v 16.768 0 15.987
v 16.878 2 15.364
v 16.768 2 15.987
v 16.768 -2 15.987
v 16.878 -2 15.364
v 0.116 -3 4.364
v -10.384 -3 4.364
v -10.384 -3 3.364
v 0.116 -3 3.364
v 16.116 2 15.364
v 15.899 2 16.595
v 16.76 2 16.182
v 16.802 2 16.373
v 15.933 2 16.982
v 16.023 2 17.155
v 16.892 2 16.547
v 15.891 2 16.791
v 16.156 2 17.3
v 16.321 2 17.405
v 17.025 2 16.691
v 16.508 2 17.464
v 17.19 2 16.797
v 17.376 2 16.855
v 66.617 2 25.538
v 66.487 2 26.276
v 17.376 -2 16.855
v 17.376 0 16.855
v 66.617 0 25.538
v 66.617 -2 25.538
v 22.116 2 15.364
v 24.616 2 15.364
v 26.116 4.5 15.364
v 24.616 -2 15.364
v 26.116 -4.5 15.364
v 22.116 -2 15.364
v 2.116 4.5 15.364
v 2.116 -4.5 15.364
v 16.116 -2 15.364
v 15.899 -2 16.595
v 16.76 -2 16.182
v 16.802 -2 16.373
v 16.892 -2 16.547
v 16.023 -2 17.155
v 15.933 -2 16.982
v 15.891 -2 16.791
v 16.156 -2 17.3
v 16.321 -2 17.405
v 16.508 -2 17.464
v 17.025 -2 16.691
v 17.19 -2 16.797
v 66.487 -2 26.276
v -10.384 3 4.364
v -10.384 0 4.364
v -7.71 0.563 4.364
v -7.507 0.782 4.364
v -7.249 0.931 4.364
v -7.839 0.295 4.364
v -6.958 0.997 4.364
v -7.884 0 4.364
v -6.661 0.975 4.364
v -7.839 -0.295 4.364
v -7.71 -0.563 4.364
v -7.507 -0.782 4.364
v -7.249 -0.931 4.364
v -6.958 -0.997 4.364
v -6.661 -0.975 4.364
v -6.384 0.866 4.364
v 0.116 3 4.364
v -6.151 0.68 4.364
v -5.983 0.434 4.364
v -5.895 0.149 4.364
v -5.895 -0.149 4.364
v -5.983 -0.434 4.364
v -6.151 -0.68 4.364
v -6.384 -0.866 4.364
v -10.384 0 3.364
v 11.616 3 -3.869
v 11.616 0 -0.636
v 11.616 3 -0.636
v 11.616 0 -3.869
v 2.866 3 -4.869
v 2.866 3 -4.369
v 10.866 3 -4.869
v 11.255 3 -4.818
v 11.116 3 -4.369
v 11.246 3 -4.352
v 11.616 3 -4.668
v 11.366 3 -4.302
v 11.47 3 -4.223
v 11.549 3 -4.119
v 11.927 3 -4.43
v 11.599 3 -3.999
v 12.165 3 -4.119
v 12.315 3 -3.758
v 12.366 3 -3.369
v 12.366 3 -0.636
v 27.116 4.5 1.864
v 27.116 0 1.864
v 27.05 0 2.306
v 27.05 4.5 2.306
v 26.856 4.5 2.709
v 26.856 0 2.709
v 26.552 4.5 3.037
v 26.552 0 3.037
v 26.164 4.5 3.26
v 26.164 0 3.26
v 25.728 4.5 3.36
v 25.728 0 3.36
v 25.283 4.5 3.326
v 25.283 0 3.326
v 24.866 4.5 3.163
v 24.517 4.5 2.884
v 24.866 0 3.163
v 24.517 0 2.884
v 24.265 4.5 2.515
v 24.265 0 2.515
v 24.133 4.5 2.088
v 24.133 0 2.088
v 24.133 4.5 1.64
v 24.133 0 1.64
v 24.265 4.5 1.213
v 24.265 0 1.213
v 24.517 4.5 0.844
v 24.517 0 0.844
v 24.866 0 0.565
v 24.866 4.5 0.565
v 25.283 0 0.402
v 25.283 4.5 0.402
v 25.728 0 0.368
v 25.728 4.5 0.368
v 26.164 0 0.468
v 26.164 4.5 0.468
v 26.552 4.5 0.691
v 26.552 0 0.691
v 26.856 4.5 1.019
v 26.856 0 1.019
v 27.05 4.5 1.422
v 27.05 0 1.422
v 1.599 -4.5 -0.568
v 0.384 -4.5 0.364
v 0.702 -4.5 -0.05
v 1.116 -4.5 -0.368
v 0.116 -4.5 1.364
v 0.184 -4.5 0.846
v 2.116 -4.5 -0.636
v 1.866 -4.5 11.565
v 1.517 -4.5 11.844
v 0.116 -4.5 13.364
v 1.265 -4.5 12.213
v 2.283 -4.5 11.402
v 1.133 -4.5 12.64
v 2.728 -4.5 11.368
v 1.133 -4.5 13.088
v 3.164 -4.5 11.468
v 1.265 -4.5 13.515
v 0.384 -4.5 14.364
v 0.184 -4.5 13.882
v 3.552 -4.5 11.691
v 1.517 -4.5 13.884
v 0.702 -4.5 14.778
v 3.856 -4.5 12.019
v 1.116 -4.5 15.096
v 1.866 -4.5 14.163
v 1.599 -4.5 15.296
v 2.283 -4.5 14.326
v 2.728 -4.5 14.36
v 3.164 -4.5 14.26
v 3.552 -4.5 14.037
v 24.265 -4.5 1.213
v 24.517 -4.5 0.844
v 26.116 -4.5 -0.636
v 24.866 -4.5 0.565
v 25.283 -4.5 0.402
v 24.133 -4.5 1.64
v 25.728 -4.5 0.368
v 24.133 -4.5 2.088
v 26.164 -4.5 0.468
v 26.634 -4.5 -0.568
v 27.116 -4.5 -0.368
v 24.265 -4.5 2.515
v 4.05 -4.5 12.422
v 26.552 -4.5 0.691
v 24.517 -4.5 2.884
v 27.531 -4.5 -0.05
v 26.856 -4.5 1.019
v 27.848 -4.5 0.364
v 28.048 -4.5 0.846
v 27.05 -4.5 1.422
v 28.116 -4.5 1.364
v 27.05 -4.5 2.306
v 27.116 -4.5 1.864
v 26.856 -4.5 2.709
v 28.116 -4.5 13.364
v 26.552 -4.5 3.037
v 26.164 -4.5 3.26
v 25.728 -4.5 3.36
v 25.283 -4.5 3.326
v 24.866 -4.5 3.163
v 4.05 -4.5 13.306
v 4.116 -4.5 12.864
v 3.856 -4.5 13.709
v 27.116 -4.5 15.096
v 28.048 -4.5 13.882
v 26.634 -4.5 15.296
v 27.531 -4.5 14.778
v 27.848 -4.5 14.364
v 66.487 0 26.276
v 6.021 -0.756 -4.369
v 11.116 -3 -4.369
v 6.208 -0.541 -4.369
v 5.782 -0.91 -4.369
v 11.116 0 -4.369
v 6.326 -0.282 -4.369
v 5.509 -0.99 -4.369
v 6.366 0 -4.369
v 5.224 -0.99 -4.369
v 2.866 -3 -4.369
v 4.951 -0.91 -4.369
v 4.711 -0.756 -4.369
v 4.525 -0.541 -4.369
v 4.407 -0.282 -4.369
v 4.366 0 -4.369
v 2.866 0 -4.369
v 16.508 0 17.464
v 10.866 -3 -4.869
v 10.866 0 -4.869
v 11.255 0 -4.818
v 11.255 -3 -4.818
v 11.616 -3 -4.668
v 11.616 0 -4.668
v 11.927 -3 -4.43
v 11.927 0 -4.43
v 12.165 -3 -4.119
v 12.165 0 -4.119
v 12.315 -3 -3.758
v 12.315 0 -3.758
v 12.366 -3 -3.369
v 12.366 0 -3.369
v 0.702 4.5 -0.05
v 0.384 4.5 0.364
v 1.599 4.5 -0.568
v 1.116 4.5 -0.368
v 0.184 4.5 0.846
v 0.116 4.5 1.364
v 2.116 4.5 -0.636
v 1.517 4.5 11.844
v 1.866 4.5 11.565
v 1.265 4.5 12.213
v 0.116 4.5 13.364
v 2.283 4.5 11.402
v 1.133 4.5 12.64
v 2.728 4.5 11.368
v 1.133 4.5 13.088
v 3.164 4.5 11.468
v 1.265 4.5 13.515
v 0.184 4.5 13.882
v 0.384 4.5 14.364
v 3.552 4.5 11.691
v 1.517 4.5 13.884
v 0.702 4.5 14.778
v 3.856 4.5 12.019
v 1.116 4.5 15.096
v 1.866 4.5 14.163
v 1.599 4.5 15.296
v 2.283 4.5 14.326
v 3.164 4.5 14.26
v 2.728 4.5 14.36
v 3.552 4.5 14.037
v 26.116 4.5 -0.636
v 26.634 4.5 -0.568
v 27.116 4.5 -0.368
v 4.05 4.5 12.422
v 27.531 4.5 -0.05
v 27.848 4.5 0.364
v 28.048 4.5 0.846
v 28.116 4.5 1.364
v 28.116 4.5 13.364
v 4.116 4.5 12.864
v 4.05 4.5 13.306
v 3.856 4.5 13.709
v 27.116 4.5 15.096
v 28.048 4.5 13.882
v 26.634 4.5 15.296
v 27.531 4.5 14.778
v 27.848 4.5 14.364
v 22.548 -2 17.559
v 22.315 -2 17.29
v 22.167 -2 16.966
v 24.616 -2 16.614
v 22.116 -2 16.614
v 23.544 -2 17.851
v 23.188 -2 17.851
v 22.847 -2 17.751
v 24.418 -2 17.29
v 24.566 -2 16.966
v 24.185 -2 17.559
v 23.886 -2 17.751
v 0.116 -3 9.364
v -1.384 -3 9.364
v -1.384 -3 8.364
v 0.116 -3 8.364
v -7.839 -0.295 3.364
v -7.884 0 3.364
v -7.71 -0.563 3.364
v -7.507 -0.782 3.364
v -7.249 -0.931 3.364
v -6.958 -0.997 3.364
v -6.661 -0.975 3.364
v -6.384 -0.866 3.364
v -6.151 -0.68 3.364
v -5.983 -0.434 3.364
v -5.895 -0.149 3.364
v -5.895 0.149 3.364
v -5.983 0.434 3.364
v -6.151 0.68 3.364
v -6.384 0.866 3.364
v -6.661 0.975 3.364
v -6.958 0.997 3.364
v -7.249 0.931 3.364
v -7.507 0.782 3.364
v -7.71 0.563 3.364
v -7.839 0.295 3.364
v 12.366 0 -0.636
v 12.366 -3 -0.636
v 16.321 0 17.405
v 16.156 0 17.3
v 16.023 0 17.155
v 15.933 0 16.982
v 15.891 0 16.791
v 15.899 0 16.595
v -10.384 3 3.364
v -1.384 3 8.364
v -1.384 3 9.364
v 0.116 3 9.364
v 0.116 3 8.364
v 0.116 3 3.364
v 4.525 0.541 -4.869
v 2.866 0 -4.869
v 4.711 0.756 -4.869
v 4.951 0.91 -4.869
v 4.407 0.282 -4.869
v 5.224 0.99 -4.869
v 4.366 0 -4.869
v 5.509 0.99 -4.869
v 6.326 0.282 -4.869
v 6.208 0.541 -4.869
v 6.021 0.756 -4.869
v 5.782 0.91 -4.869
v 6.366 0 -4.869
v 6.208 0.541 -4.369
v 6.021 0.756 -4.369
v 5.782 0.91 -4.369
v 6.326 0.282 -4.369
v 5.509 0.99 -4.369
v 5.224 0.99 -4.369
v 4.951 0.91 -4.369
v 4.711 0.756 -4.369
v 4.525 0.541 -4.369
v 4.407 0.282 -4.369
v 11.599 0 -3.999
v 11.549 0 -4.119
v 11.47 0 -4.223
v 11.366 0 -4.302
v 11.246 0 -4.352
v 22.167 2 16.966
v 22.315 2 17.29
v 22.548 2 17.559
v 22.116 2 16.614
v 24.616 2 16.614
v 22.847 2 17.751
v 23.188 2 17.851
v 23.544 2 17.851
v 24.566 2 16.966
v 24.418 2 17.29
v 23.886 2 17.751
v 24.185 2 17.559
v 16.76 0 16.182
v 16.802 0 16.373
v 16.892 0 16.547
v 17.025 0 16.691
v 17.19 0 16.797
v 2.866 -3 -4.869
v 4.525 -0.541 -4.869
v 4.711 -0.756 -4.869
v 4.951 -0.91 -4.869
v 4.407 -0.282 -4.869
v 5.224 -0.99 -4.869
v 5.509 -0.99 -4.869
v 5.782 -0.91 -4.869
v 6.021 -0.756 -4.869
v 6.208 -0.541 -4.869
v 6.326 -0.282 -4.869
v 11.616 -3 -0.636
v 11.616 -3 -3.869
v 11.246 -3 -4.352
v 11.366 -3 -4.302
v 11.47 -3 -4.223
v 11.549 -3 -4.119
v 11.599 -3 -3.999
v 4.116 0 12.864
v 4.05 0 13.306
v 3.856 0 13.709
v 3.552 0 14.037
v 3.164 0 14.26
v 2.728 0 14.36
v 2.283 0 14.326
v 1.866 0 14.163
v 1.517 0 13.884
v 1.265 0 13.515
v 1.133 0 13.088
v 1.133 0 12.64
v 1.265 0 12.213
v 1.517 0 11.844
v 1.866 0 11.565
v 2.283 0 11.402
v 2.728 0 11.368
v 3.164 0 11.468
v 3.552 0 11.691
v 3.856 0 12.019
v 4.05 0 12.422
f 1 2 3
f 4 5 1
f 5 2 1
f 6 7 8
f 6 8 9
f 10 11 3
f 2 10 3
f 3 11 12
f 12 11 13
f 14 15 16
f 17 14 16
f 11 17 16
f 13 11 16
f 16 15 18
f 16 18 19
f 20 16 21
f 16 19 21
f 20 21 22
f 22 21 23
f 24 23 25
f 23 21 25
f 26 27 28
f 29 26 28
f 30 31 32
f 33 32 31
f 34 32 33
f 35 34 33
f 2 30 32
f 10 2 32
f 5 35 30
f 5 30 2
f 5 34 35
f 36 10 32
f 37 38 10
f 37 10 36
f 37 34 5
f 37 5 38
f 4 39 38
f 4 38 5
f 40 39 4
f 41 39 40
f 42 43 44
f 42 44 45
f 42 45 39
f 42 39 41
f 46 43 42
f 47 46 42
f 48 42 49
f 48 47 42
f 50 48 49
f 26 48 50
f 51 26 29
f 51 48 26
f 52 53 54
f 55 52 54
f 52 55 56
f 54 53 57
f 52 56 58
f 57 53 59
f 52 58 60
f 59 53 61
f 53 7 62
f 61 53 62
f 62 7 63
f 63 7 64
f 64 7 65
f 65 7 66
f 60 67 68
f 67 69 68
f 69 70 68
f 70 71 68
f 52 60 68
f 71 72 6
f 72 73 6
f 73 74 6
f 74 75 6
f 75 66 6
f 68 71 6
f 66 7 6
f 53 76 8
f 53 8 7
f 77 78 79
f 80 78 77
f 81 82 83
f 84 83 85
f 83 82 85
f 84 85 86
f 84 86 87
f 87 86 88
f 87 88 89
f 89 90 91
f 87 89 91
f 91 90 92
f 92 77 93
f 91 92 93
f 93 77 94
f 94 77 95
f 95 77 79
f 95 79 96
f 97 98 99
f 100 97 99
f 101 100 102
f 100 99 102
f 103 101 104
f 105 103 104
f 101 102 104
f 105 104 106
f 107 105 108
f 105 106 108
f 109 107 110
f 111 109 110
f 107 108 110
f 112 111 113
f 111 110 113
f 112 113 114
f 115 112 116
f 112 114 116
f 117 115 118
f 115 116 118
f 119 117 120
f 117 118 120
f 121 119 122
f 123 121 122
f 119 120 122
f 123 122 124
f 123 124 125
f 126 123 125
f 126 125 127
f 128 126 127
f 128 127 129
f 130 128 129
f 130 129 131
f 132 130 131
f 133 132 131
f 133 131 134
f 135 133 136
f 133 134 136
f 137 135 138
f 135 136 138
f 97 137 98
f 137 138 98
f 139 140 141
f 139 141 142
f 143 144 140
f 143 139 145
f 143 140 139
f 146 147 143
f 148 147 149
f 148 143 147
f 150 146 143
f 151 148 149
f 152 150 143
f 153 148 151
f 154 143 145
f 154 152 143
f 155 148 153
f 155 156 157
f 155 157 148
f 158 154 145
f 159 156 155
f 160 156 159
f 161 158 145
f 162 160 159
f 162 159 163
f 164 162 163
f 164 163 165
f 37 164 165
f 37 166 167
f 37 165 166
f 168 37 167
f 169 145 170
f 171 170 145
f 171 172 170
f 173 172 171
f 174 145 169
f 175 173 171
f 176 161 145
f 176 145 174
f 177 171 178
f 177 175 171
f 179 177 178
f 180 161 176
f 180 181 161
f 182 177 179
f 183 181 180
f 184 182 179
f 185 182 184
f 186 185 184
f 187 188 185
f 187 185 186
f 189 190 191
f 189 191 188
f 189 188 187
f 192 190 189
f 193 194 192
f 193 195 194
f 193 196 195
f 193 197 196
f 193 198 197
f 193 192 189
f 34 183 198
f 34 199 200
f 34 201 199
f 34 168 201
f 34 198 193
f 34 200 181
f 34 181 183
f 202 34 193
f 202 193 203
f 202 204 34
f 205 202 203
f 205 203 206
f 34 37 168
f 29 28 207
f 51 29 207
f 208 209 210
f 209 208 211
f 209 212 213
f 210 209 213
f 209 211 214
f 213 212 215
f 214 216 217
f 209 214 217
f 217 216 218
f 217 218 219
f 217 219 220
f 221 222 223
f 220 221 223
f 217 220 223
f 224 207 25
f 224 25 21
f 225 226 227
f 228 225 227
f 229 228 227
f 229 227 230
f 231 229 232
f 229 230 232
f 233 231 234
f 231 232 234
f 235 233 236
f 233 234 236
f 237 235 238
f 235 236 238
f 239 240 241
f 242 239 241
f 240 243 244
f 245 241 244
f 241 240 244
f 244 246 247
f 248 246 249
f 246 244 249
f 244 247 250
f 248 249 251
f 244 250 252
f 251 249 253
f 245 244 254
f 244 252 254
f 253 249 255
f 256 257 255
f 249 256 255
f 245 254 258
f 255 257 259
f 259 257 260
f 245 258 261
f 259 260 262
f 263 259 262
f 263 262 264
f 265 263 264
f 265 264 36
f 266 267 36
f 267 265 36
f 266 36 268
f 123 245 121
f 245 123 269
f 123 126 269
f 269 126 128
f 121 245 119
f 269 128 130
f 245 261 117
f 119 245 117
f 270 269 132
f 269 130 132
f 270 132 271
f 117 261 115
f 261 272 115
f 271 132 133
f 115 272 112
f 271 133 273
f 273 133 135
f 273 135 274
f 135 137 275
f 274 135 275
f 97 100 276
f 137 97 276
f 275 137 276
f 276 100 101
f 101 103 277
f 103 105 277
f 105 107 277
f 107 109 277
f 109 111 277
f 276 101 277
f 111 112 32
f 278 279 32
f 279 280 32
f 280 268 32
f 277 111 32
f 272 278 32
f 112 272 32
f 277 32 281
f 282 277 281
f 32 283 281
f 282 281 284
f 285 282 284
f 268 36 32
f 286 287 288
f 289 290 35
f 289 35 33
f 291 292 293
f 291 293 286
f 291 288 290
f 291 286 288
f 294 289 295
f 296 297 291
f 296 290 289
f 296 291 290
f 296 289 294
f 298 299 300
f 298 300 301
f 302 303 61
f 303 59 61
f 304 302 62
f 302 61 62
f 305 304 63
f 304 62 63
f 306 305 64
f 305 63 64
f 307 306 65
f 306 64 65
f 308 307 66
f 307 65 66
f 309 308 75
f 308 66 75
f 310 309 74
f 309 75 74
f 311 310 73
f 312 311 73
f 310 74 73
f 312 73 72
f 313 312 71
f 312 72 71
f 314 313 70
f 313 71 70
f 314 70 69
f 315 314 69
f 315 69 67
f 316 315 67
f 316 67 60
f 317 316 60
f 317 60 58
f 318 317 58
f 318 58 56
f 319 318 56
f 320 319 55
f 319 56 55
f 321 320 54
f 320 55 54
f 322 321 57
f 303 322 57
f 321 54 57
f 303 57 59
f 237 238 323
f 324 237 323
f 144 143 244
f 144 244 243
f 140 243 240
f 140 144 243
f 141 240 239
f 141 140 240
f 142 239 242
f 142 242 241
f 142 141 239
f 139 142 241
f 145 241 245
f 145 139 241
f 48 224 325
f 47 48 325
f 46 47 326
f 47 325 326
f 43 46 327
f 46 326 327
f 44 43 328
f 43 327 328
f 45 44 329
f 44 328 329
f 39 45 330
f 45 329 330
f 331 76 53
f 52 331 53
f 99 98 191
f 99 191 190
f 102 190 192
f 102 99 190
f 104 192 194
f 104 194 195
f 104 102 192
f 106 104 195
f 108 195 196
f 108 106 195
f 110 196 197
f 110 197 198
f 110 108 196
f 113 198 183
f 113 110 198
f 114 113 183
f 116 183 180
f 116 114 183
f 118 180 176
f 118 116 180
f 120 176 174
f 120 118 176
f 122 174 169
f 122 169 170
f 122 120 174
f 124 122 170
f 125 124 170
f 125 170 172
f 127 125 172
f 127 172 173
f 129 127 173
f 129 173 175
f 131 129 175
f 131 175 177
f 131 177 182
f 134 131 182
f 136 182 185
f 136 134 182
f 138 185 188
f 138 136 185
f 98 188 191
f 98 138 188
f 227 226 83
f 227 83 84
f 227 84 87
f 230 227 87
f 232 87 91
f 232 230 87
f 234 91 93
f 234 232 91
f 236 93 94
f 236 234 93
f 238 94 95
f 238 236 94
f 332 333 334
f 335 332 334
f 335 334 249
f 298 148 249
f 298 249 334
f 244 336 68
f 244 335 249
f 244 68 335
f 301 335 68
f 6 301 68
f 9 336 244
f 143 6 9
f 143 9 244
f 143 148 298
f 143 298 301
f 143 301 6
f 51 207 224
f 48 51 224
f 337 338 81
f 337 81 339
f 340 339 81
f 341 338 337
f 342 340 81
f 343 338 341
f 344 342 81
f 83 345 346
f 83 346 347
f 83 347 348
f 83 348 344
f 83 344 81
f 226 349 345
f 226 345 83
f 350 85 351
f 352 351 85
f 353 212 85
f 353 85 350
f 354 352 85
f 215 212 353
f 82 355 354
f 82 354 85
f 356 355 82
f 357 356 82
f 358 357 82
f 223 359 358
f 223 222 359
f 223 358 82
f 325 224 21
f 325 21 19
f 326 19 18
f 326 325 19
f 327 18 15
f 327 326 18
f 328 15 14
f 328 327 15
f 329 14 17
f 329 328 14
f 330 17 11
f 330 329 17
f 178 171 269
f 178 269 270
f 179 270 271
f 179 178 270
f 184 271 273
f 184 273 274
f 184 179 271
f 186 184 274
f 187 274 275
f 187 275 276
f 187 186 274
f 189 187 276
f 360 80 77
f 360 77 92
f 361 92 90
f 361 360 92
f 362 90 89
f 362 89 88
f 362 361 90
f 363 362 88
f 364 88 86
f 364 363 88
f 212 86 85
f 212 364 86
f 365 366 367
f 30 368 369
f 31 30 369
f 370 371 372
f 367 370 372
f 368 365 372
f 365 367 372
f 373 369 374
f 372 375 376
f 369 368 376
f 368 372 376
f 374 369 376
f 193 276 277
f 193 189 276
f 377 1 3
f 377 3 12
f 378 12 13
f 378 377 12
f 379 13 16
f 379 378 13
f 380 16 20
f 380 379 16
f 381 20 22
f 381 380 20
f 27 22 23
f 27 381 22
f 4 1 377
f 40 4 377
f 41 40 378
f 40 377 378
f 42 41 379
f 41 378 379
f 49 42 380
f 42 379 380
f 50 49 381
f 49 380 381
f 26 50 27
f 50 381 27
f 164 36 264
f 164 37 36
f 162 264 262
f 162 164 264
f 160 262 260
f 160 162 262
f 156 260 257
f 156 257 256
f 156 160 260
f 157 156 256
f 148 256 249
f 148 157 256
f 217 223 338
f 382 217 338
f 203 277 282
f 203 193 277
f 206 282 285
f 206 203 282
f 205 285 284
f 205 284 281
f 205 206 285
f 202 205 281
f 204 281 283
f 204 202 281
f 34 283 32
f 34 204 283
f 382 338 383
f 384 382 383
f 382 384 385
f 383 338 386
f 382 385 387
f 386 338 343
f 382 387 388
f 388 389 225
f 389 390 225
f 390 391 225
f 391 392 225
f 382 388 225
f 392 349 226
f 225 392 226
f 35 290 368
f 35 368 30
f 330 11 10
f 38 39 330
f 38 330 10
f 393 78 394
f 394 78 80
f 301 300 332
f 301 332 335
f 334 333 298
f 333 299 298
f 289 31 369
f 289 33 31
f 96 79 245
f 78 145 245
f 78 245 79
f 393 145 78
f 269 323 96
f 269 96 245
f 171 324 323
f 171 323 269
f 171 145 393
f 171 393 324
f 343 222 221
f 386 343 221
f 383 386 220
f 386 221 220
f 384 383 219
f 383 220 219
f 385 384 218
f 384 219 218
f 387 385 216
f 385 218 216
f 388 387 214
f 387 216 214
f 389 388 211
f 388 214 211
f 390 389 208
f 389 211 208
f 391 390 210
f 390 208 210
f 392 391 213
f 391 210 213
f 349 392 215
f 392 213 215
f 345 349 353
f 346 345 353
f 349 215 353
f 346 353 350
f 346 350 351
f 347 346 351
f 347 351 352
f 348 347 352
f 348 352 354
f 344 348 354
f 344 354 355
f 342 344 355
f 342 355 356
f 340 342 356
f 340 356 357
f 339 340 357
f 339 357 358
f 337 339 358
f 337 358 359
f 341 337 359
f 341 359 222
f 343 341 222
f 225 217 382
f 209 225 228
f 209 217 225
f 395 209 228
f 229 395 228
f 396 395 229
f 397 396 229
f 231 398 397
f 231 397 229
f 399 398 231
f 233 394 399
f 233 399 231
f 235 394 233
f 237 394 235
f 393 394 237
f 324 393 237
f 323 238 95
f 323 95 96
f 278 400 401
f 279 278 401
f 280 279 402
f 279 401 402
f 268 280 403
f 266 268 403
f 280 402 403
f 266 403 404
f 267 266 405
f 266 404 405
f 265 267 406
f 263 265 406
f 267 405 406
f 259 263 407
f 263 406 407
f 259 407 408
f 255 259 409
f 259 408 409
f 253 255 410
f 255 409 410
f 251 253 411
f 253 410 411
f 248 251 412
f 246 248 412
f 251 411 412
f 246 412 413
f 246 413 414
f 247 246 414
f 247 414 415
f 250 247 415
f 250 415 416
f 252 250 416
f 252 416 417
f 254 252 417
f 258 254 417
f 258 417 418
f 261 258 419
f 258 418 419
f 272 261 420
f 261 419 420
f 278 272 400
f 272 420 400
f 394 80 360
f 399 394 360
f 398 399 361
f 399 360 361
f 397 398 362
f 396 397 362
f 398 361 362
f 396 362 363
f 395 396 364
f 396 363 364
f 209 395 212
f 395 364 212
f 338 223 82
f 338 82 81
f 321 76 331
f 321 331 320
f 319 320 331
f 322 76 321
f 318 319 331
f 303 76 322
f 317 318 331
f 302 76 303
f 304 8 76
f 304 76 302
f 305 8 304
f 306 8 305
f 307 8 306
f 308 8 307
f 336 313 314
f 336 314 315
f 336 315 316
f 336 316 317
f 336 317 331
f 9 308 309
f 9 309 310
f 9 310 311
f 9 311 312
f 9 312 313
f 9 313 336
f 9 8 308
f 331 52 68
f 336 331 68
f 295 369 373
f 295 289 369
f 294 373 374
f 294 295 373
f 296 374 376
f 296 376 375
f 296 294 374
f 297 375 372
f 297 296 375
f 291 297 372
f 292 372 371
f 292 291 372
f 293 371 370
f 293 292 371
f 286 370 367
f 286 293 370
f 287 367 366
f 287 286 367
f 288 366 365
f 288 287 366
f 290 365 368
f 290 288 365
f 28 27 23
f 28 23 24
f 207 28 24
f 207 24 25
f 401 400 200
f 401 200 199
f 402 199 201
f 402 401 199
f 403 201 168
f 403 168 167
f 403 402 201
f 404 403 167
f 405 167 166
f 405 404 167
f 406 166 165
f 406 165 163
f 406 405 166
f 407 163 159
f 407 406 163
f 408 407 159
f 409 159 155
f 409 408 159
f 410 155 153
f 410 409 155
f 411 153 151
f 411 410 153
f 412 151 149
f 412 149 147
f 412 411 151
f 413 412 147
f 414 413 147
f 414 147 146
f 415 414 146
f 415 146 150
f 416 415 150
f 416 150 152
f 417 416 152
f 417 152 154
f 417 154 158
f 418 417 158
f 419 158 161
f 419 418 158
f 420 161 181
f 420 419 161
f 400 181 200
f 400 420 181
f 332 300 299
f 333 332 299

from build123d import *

# Parameters (mm, degrees)
F0_R           = 1.5
F1_DEPTH       = 4.5
F0_W           = 1.5
F0_H           = 1
F0_W_2         = 10.5
F2_DEPTH       = 3
F3_DEPTH       = 2
F4_DEPTH       = 4.5
F5_DEPTH       = 3
F6_DEPTH       = 2
F9_D           = 2
F9_DEPTH       = 1
F9_TIP         = 0.600860619
F9_ON_F8_D     = 2
F9_ON_F8_DEPTH = 1
F9_ON_F8_TIP   = 0.600860619


with BuildPart() as f1:
    # F0 (on Front) → F1 (new body)
    with BuildSketch(Plane.XZ):
        with BuildLine():
            Line((16.1163130835, 15.3639883176), (2.1163130835, 15.3639883176))
            ThreePointArc((2.1163130835, 15.3639883176), (0.7020995211, 14.77820188), (0.1163130835, 13.3639883176))
            Line((0.1163130835, 13.3639883176), (0.1163130835, 9.3639883176))
            Line((0.1163130835, 9.3639883176), (0.1163130835, 8.3639883176))
            Line((0.1163130835, 8.3639883176), (0.1163130835, 4.3639883176))
            Line((0.1163130835, 4.3639883176), (0.1163130835, 3.3639883176))
            Line((0.1163130835, 3.3639883176), (0.1163130835, 1.3639883176))
            ThreePointArc((0.1163130835, 1.3639883176), (0.7020995211, -0.0502252447), (2.1163130835, -0.6360116824))
            Line((2.1163130835, -0.6360116824), (11.6163130835, -0.6360116824))
            Line((11.6163130835, -0.6360116824), (12.3663130835, -0.6360116824))
            Line((12.3663130835, -0.6360116824), (26.1163130835, -0.6360116824))
            ThreePointArc((26.1163130835, -0.6360116824), (27.5305266458, -0.0502252447), (28.1163130835, 1.3639883176))
            Line((28.1163130835, 1.3639883176), (28.1163130835, 13.3639883176))
            ThreePointArc((28.1163130835, 13.3639883176), (27.5305266458, 14.77820188), (26.1163130835, 15.3639883176))
            Line((26.1163130835, 15.3639883176), (24.6163130835, 15.3639883176))
            Line((24.6163130835, 15.3639883176), (23.3663130835, 15.3639883176))
            Line((23.3663130835, 15.3639883176), (22.1163130835, 15.3639883176))
            Line((22.1163130835, 15.3639883176), (16.8778830424, 15.3639883176))
            Line((16.8778830424, 15.3639883176), (16.1163130835, 15.3639883176))
        make_face()
        with Locations((25.6163130835, 1.8639883176)):
            Circle(F0_R, mode=Mode.SUBTRACT)
        with Locations((2.6163130835, 12.8639883176)):
            Circle(F0_R, mode=Mode.SUBTRACT)
    extrude(amount=F1_DEPTH)

    # F0 (on Front) → F2 (join)
    with BuildSketch(Plane.XZ):
        with Locations((-0.6336869165, 8.8639883176)):
            Rectangle(F0_W, F0_H)
        with Locations((-5.1336869165, 3.8639883176)):
            Rectangle(F0_W_2, F0_H)
        with BuildLine():
            Line((12.3663130835, -0.6360116824), (11.6163130835, -0.6360116824))
            Line((11.6163130835, -0.6360116824), (11.6163130835, -3.8694406524))
            ThreePointArc((11.6163130835, -3.8694406524), (11.4698664741, -4.222994043), (11.1163130835, -4.3694406524))
            Line((11.1163130835, -4.3694406524), (2.8663130835, -4.3694406524))
            Line((2.8663130835, -4.3694406524), (2.8663130835, -4.8694406524))
            Line((2.8663130835, -4.8694406524), (10.8663130835, -4.8694406524))
            ThreePointArc((10.8663130835, -4.8694406524), (11.9269732552, -4.4301008242), (12.3663130835, -3.3694406524))
            Line((12.3663130835, -3.3694406524), (12.3663130835, -0.6360116824))
        make_face()
    extrude(amount=F2_DEPTH)

    # F0 (on Front) → F3 (join)
    with BuildSketch(Plane.XZ):
        with BuildLine():
            Line((15.8992528614, 16.5949980089), (16.1163130835, 15.3639883176))
            Line((16.1163130835, 15.3639883176), (16.8778830424, 15.3639883176))
            Line((16.8778830424, 15.3639883176), (16.7680948094, 15.9866283274))
            ThreePointArc((16.7680948094, 15.9866283274), (16.8923365909, 16.5470467879), (17.3764644909, 16.8554702754))
            Line((17.3764644909, 16.8554702754), (66.6168521415, 25.5378791587))
            Line((66.6168521415, 25.5378791587), (66.4866160083, 26.2764849735))
            Line((66.4866160083, 26.2764849735), (16.5076225429, 17.4638399569))
            ThreePointArc((16.5076225429, 17.4638399569), (16.0234946429, 17.1554164694), (15.8992528614, 16.5949980089))
        make_face()
        with BuildLine():
            ThreePointArc((24.6163130835, 16.6139883176), (24.25019656, 15.7301048411), (23.3663130835, 15.3639883176))
            Line((23.3663130835, 15.3639883176), (24.6163130835, 15.3639883176))
            Line((24.6163130835, 15.3639883176), (24.6163130835, 16.6139883176))
        make_face()
        with BuildLine():
            Line((22.1163130835, 16.6139883176), (22.1163130835, 15.3639883176))
            Line((22.1163130835, 15.3639883176), (23.3663130835, 15.3639883176))
            ThreePointArc((23.3663130835, 15.3639883176), (22.482429607, 15.7301048411), (22.1163130835, 16.6139883176))
        make_face()
        with BuildLine():
            ThreePointArc((22.1163130835, 16.6139883176), (22.482429607, 15.7301048411), (23.3663130835, 15.3639883176))
            ThreePointArc((23.3663130835, 15.3639883176), (24.25019656, 15.7301048411), (24.6163130835, 16.6139883176))
            Line((24.6163130835, 16.6139883176), (22.1163130835, 16.6139883176))
        make_face()
        with BuildLine():
            ThreePointArc((24.6163130835, 16.6139883176), (23.3663130835, 17.8639883176), (22.1163130835, 16.6139883176))
            Line((22.1163130835, 16.6139883176), (24.6163130835, 16.6139883176))
        make_face()
    extrude(amount=F3_DEPTH)

    # F0 (on Front) → F4 (join)
    with BuildSketch(Plane.XZ):
        with BuildLine():
            Line((16.1163130835, 15.3639883176), (2.1163130835, 15.3639883176))
            ThreePointArc((2.1163130835, 15.3639883176), (0.7020995211, 14.77820188), (0.1163130835, 13.3639883176))
            Line((0.1163130835, 13.3639883176), (0.1163130835, 9.3639883176))
            Line((0.1163130835, 9.3639883176), (0.1163130835, 8.3639883176))
            Line((0.1163130835, 8.3639883176), (0.1163130835, 4.3639883176))
            Line((0.1163130835, 4.3639883176), (0.1163130835, 3.3639883176))
            Line((0.1163130835, 3.3639883176), (0.1163130835, 1.3639883176))
            ThreePointArc((0.1163130835, 1.3639883176), (0.7020995211, -0.0502252447), (2.1163130835, -0.6360116824))
            Line((2.1163130835, -0.6360116824), (11.6163130835, -0.6360116824))
            Line((11.6163130835, -0.6360116824), (12.3663130835, -0.6360116824))
            Line((12.3663130835, -0.6360116824), (26.1163130835, -0.6360116824))
            ThreePointArc((26.1163130835, -0.6360116824), (27.5305266458, -0.0502252447), (28.1163130835, 1.3639883176))
            Line((28.1163130835, 1.3639883176), (28.1163130835, 13.3639883176))
            ThreePointArc((28.1163130835, 13.3639883176), (27.5305266458, 14.77820188), (26.1163130835, 15.3639883176))
            Line((26.1163130835, 15.3639883176), (24.6163130835, 15.3639883176))
            Line((24.6163130835, 15.3639883176), (23.3663130835, 15.3639883176))
            Line((23.3663130835, 15.3639883176), (22.1163130835, 15.3639883176))
            Line((22.1163130835, 15.3639883176), (16.8778830424, 15.3639883176))
            Line((16.8778830424, 15.3639883176), (16.1163130835, 15.3639883176))
        make_face()
        with Locations((25.6163130835, 1.8639883176)):
            Circle(F0_R, mode=Mode.SUBTRACT)
        with Locations((2.6163130835, 12.8639883176)):
            Circle(F0_R, mode=Mode.SUBTRACT)
    extrude(amount=-F4_DEPTH)

    # F0 (on Front) → F5 (join)
    with BuildSketch(Plane.XZ):
        with Locations((-0.6336869165, 8.8639883176)):
            Rectangle(F0_W, F0_H)
        with Locations((-5.1336869165, 3.8639883176)):
            Rectangle(F0_W_2, F0_H)
        with BuildLine():
            Line((12.3663130835, -0.6360116824), (11.6163130835, -0.6360116824))
            Line((11.6163130835, -0.6360116824), (11.6163130835, -3.8694406524))
            ThreePointArc((11.6163130835, -3.8694406524), (11.4698664741, -4.222994043), (11.1163130835, -4.3694406524))
            Line((11.1163130835, -4.3694406524), (2.8663130835, -4.3694406524))
            Line((2.8663130835, -4.3694406524), (2.8663130835, -4.8694406524))
            Line((2.8663130835, -4.8694406524), (10.8663130835, -4.8694406524))
            ThreePointArc((10.8663130835, -4.8694406524), (11.9269732552, -4.4301008242), (12.3663130835, -3.3694406524))
            Line((12.3663130835, -3.3694406524), (12.3663130835, -0.6360116824))
        make_face()
    extrude(amount=-F5_DEPTH)

    # F0 (on Front) → F6 (join)
    with BuildSketch(Plane.XZ):
        with BuildLine():
            ThreePointArc((24.6163130835, 16.6139883176), (23.3663130835, 17.8639883176), (22.1163130835, 16.6139883176))
            Line((22.1163130835, 16.6139883176), (24.6163130835, 16.6139883176))
        make_face()
        with BuildLine():
            ThreePointArc((22.1163130835, 16.6139883176), (22.482429607, 15.7301048411), (23.3663130835, 15.3639883176))
            ThreePointArc((23.3663130835, 15.3639883176), (24.25019656, 15.7301048411), (24.6163130835, 16.6139883176))
            Line((24.6163130835, 16.6139883176), (22.1163130835, 16.6139883176))
        make_face()
        with BuildLine():
            ThreePointArc((24.6163130835, 16.6139883176), (24.25019656, 15.7301048411), (23.3663130835, 15.3639883176))
            Line((23.3663130835, 15.3639883176), (24.6163130835, 15.3639883176))
            Line((24.6163130835, 15.3639883176), (24.6163130835, 16.6139883176))
        make_face()
        with BuildLine():
            Line((22.1163130835, 16.6139883176), (22.1163130835, 15.3639883176))
            Line((22.1163130835, 15.3639883176), (23.3663130835, 15.3639883176))
            ThreePointArc((23.3663130835, 15.3639883176), (22.482429607, 15.7301048411), (22.1163130835, 16.6139883176))
        make_face()
        with BuildLine():
            Line((15.8992528614, 16.5949980089), (16.1163130835, 15.3639883176))
            Line((16.1163130835, 15.3639883176), (16.8778830424, 15.3639883176))
            Line((16.8778830424, 15.3639883176), (16.7680948094, 15.9866283274))
            ThreePointArc((16.7680948094, 15.9866283274), (16.8923365909, 16.5470467879), (17.3764644909, 16.8554702754))
            Line((17.3764644909, 16.8554702754), (66.6168521415, 25.5378791587))
            Line((66.6168521415, 25.5378791587), (66.4866160083, 26.2764849735))
            Line((66.4866160083, 26.2764849735), (16.5076225429, 17.4638399569))
            ThreePointArc((16.5076225429, 17.4638399569), (16.0234946429, 17.1554164694), (15.8992528614, 16.5949980089))
        make_face()
    extrude(amount=-F6_DEPTH)

    # F9
    with Locations(Plane(origin=(0, 0, -4.8694406524), x_dir=(1, 0, 0), z_dir=(0, 0, -1))):
        with Locations((5.3663130835, 0)):
            Hole(F9_D / 2, depth=F9_DEPTH)
            with Locations((0, 0, -(F9_DEPTH + F9_TIP / 2))):  # 118° drill point
                Cone(0, F9_D / 2, F9_TIP, mode=Mode.SUBTRACT)

    # F9 on F8
    with Locations(Plane(origin=(0, 0, 3.3639883176), x_dir=(1, 0, 0), z_dir=(0, 0, -1))):
        with Locations((-6.8836869165, 0)):
            Hole(F9_ON_F8_D / 2, depth=F9_ON_F8_DEPTH)
            with Locations((0, 0, -(F9_ON_F8_DEPTH + F9_ON_F8_TIP / 2))):  # 118° drill point
                Cone(0, F9_ON_F8_D / 2, F9_ON_F8_TIP, mode=Mode.SUBTRACT)


solid = f1.part
